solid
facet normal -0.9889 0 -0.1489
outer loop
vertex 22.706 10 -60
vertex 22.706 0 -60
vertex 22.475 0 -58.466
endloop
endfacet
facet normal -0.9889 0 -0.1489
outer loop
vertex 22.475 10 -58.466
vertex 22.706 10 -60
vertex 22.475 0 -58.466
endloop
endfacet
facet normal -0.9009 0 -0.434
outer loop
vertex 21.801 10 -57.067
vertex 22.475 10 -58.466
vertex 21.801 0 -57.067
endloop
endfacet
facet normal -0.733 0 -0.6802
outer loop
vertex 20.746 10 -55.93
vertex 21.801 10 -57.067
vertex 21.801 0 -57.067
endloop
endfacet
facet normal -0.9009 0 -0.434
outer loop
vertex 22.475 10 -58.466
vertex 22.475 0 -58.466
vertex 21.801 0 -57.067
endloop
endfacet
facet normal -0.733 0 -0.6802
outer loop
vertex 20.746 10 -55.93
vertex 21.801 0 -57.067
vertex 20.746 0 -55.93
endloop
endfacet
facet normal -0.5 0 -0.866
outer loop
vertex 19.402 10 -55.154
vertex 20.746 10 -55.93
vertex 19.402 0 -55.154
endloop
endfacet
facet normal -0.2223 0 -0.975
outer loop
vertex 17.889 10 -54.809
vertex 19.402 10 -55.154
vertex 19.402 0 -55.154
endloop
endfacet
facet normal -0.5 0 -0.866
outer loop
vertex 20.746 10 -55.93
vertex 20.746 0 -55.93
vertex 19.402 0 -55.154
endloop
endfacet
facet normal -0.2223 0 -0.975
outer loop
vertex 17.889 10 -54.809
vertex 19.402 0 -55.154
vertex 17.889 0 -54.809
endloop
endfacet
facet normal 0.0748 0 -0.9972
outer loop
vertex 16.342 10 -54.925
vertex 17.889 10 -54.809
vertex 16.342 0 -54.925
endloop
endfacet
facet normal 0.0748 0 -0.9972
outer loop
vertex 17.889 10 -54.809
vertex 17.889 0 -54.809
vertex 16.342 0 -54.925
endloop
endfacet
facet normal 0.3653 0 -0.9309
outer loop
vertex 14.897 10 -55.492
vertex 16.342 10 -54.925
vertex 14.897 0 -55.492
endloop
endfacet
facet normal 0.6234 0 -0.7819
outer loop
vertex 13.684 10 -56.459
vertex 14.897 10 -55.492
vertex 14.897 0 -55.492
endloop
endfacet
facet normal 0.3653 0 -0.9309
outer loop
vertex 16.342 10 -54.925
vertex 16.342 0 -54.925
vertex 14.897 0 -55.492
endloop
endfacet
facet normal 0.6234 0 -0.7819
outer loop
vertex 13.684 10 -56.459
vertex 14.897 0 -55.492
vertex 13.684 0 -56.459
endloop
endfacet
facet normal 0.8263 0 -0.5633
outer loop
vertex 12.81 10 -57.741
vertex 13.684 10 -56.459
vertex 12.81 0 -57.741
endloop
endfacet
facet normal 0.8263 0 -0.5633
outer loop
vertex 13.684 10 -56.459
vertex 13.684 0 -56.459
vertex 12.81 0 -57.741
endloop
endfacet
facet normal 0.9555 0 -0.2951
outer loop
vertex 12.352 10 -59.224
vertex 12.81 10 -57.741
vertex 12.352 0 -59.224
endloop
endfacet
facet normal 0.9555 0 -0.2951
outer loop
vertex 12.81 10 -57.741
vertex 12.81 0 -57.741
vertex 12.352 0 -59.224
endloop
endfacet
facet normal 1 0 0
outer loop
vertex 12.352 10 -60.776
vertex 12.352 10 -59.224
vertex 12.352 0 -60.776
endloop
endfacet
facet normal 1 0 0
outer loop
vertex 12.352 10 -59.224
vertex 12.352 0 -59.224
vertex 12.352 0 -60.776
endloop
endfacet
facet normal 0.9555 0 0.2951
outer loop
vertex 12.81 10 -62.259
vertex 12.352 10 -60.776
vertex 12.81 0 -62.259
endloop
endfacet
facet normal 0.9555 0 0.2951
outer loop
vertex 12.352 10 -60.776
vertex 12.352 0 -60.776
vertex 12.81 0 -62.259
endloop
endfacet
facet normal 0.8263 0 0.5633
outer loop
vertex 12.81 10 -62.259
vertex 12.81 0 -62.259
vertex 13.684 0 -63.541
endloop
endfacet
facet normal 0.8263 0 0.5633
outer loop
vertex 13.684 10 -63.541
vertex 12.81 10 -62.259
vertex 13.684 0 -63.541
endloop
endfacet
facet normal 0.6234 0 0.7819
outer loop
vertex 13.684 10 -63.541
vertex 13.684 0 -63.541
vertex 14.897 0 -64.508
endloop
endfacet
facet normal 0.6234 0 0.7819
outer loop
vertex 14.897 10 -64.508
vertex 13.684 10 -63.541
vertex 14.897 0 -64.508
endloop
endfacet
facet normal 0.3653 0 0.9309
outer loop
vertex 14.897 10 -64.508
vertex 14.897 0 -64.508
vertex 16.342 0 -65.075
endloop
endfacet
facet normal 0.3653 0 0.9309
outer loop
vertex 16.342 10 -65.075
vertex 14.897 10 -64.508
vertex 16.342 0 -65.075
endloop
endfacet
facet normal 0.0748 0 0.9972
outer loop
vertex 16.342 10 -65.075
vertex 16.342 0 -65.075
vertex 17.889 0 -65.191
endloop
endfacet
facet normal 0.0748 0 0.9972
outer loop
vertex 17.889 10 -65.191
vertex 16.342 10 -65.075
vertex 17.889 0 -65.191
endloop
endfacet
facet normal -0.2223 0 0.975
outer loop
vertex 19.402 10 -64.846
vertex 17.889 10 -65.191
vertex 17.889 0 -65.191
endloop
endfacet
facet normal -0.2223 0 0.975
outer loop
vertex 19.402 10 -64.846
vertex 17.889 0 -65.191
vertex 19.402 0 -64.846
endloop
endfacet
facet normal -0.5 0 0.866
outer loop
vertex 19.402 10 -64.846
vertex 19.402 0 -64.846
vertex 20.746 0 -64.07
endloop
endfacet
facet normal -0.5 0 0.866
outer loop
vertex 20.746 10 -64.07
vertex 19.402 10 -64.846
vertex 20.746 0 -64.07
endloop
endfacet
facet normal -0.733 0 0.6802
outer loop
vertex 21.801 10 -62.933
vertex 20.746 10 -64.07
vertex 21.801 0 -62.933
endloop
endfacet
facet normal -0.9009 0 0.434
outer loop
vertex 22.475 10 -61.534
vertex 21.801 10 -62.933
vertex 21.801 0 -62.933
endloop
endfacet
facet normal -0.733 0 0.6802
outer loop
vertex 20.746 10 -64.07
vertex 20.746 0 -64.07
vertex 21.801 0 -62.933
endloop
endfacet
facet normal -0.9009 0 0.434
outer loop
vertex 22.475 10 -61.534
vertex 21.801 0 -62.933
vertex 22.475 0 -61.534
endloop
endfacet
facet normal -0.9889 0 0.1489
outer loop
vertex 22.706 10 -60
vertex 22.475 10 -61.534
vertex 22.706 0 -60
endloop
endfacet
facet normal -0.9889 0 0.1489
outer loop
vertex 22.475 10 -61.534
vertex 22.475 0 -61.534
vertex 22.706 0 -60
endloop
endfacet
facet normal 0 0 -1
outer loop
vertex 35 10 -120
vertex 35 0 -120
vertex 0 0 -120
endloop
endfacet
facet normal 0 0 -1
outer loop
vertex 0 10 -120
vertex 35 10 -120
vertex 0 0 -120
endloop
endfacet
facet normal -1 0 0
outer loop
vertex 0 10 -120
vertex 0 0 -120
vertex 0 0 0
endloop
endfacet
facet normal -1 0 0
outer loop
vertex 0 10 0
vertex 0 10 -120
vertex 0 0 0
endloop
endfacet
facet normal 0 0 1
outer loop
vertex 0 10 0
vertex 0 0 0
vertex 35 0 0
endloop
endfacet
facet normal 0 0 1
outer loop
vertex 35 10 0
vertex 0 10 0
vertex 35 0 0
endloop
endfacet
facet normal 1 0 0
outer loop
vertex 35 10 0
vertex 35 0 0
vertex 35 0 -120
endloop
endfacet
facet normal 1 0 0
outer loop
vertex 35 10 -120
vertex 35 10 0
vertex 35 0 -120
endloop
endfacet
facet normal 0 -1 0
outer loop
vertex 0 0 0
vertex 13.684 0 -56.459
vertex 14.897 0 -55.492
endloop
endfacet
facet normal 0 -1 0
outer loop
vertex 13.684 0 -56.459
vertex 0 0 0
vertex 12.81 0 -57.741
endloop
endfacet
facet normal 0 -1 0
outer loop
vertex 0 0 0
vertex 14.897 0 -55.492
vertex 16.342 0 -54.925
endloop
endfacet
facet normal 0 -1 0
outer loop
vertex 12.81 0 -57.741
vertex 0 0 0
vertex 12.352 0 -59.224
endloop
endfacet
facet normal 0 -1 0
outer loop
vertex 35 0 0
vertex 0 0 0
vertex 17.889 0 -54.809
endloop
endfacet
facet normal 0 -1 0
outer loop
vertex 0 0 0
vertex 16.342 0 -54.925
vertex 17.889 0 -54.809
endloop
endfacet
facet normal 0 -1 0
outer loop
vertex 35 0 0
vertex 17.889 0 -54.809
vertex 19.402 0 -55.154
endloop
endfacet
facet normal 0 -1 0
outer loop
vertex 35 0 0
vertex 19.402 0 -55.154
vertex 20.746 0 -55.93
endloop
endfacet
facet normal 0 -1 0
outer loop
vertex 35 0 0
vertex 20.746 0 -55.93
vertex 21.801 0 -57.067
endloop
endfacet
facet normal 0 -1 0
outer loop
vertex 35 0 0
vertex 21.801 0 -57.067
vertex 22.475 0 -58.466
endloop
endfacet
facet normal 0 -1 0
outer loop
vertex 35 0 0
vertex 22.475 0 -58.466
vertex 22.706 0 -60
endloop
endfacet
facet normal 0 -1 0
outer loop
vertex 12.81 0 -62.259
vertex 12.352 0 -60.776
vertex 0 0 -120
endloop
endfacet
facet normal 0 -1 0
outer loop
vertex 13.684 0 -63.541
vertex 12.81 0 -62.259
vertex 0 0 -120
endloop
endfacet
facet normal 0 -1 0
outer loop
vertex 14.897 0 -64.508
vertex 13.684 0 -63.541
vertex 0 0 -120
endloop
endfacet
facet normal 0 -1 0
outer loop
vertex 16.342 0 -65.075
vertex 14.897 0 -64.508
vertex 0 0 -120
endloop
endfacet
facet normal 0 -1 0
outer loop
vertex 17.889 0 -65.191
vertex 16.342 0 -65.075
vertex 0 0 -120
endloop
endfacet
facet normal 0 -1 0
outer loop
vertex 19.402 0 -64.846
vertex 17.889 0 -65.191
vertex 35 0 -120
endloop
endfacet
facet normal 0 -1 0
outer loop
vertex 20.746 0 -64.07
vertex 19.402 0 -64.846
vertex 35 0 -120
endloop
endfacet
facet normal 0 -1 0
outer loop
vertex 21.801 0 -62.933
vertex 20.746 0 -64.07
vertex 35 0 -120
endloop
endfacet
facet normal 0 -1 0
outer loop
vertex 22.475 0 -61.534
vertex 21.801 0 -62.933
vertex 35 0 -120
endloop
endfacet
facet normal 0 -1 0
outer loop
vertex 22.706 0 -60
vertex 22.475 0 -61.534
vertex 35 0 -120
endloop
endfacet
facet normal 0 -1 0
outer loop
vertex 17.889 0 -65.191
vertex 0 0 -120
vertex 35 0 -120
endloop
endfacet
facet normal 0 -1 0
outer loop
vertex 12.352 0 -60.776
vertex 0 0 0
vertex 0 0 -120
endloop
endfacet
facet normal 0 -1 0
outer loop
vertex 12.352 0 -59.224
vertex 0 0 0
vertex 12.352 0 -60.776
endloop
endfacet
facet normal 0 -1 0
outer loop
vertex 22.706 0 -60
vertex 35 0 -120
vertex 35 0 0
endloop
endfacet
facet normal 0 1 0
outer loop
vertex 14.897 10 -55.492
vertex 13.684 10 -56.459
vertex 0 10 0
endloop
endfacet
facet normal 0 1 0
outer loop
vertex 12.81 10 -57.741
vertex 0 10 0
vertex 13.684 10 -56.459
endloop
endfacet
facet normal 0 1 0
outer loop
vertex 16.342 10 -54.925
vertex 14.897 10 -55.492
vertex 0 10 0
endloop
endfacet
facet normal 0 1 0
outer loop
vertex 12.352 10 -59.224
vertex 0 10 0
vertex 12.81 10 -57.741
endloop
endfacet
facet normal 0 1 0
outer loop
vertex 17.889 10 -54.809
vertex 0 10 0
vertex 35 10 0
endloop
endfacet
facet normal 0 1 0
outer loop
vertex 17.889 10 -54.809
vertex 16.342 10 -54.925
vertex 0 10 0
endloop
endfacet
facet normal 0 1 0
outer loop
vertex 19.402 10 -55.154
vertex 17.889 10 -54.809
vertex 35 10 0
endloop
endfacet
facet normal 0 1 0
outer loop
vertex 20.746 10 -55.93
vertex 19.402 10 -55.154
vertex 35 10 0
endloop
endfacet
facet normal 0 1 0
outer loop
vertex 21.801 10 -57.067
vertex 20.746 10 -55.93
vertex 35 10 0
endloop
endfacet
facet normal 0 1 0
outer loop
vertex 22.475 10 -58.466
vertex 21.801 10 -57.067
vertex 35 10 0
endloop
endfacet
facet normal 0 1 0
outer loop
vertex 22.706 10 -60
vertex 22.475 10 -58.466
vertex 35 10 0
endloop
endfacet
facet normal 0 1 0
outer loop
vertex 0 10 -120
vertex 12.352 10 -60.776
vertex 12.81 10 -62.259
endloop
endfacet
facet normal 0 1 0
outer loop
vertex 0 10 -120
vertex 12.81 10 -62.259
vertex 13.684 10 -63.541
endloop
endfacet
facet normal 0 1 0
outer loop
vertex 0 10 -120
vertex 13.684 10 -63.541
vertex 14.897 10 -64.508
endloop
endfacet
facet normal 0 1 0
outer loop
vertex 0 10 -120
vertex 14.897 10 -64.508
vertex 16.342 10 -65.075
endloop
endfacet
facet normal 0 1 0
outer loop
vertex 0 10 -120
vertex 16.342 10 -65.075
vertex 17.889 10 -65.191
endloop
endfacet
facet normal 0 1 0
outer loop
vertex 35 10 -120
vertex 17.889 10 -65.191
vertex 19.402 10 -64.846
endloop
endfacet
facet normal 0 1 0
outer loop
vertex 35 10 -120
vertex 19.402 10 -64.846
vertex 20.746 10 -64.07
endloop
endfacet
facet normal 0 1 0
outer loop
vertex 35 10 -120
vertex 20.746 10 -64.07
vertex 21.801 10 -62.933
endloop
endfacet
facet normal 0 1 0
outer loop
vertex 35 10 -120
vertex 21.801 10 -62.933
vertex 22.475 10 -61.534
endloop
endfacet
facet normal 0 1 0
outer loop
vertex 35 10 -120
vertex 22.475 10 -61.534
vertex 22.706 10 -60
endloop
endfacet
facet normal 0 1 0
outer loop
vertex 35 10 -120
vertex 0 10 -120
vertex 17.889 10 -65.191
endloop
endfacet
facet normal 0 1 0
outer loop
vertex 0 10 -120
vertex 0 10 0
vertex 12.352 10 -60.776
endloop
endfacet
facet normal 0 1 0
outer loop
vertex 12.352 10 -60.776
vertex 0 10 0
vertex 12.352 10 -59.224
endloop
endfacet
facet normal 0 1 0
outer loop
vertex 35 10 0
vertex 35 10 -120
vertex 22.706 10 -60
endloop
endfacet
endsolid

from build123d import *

# Parameters (mm, degrees)
BOSS_EXTRUDE1_DEPTH = 10


with BuildPart() as part:
    # Sketch1 → Boss-Extrude1 (new body)
    with BuildSketch(Plane(origin=(0, 0, 0), x_dir=(1, 0, 0), z_dir=(0, 1, 0))):
        with BuildLine():
            Line((0, 120), (0, 60))
            Line((0, 60), (12.294200791, 60))
            ThreePointArc((12.294200791, 60), (17.5, 65.205799209), (22.705799209, 60))
            Line((22.705799209, 60), (35, 60))
            Line((35, 60), (35, 120))
            Line((35, 120), (0, 120))
        make_face()
        with BuildLine():
            Line((0, 60), (0, 0))
            Line((0, 0), (35, 0))
            Line((35, 0), (35, 60))
            Line((35, 60), (22.705799209, 60))
            ThreePointArc((22.705799209, 60), (17.5, 54.794200791), (12.294200791, 60))
            Line((12.294200791, 60), (0, 60))
        make_face()
    extrude(amount=BOSS_EXTRUDE1_DEPTH)


solid = part.part
